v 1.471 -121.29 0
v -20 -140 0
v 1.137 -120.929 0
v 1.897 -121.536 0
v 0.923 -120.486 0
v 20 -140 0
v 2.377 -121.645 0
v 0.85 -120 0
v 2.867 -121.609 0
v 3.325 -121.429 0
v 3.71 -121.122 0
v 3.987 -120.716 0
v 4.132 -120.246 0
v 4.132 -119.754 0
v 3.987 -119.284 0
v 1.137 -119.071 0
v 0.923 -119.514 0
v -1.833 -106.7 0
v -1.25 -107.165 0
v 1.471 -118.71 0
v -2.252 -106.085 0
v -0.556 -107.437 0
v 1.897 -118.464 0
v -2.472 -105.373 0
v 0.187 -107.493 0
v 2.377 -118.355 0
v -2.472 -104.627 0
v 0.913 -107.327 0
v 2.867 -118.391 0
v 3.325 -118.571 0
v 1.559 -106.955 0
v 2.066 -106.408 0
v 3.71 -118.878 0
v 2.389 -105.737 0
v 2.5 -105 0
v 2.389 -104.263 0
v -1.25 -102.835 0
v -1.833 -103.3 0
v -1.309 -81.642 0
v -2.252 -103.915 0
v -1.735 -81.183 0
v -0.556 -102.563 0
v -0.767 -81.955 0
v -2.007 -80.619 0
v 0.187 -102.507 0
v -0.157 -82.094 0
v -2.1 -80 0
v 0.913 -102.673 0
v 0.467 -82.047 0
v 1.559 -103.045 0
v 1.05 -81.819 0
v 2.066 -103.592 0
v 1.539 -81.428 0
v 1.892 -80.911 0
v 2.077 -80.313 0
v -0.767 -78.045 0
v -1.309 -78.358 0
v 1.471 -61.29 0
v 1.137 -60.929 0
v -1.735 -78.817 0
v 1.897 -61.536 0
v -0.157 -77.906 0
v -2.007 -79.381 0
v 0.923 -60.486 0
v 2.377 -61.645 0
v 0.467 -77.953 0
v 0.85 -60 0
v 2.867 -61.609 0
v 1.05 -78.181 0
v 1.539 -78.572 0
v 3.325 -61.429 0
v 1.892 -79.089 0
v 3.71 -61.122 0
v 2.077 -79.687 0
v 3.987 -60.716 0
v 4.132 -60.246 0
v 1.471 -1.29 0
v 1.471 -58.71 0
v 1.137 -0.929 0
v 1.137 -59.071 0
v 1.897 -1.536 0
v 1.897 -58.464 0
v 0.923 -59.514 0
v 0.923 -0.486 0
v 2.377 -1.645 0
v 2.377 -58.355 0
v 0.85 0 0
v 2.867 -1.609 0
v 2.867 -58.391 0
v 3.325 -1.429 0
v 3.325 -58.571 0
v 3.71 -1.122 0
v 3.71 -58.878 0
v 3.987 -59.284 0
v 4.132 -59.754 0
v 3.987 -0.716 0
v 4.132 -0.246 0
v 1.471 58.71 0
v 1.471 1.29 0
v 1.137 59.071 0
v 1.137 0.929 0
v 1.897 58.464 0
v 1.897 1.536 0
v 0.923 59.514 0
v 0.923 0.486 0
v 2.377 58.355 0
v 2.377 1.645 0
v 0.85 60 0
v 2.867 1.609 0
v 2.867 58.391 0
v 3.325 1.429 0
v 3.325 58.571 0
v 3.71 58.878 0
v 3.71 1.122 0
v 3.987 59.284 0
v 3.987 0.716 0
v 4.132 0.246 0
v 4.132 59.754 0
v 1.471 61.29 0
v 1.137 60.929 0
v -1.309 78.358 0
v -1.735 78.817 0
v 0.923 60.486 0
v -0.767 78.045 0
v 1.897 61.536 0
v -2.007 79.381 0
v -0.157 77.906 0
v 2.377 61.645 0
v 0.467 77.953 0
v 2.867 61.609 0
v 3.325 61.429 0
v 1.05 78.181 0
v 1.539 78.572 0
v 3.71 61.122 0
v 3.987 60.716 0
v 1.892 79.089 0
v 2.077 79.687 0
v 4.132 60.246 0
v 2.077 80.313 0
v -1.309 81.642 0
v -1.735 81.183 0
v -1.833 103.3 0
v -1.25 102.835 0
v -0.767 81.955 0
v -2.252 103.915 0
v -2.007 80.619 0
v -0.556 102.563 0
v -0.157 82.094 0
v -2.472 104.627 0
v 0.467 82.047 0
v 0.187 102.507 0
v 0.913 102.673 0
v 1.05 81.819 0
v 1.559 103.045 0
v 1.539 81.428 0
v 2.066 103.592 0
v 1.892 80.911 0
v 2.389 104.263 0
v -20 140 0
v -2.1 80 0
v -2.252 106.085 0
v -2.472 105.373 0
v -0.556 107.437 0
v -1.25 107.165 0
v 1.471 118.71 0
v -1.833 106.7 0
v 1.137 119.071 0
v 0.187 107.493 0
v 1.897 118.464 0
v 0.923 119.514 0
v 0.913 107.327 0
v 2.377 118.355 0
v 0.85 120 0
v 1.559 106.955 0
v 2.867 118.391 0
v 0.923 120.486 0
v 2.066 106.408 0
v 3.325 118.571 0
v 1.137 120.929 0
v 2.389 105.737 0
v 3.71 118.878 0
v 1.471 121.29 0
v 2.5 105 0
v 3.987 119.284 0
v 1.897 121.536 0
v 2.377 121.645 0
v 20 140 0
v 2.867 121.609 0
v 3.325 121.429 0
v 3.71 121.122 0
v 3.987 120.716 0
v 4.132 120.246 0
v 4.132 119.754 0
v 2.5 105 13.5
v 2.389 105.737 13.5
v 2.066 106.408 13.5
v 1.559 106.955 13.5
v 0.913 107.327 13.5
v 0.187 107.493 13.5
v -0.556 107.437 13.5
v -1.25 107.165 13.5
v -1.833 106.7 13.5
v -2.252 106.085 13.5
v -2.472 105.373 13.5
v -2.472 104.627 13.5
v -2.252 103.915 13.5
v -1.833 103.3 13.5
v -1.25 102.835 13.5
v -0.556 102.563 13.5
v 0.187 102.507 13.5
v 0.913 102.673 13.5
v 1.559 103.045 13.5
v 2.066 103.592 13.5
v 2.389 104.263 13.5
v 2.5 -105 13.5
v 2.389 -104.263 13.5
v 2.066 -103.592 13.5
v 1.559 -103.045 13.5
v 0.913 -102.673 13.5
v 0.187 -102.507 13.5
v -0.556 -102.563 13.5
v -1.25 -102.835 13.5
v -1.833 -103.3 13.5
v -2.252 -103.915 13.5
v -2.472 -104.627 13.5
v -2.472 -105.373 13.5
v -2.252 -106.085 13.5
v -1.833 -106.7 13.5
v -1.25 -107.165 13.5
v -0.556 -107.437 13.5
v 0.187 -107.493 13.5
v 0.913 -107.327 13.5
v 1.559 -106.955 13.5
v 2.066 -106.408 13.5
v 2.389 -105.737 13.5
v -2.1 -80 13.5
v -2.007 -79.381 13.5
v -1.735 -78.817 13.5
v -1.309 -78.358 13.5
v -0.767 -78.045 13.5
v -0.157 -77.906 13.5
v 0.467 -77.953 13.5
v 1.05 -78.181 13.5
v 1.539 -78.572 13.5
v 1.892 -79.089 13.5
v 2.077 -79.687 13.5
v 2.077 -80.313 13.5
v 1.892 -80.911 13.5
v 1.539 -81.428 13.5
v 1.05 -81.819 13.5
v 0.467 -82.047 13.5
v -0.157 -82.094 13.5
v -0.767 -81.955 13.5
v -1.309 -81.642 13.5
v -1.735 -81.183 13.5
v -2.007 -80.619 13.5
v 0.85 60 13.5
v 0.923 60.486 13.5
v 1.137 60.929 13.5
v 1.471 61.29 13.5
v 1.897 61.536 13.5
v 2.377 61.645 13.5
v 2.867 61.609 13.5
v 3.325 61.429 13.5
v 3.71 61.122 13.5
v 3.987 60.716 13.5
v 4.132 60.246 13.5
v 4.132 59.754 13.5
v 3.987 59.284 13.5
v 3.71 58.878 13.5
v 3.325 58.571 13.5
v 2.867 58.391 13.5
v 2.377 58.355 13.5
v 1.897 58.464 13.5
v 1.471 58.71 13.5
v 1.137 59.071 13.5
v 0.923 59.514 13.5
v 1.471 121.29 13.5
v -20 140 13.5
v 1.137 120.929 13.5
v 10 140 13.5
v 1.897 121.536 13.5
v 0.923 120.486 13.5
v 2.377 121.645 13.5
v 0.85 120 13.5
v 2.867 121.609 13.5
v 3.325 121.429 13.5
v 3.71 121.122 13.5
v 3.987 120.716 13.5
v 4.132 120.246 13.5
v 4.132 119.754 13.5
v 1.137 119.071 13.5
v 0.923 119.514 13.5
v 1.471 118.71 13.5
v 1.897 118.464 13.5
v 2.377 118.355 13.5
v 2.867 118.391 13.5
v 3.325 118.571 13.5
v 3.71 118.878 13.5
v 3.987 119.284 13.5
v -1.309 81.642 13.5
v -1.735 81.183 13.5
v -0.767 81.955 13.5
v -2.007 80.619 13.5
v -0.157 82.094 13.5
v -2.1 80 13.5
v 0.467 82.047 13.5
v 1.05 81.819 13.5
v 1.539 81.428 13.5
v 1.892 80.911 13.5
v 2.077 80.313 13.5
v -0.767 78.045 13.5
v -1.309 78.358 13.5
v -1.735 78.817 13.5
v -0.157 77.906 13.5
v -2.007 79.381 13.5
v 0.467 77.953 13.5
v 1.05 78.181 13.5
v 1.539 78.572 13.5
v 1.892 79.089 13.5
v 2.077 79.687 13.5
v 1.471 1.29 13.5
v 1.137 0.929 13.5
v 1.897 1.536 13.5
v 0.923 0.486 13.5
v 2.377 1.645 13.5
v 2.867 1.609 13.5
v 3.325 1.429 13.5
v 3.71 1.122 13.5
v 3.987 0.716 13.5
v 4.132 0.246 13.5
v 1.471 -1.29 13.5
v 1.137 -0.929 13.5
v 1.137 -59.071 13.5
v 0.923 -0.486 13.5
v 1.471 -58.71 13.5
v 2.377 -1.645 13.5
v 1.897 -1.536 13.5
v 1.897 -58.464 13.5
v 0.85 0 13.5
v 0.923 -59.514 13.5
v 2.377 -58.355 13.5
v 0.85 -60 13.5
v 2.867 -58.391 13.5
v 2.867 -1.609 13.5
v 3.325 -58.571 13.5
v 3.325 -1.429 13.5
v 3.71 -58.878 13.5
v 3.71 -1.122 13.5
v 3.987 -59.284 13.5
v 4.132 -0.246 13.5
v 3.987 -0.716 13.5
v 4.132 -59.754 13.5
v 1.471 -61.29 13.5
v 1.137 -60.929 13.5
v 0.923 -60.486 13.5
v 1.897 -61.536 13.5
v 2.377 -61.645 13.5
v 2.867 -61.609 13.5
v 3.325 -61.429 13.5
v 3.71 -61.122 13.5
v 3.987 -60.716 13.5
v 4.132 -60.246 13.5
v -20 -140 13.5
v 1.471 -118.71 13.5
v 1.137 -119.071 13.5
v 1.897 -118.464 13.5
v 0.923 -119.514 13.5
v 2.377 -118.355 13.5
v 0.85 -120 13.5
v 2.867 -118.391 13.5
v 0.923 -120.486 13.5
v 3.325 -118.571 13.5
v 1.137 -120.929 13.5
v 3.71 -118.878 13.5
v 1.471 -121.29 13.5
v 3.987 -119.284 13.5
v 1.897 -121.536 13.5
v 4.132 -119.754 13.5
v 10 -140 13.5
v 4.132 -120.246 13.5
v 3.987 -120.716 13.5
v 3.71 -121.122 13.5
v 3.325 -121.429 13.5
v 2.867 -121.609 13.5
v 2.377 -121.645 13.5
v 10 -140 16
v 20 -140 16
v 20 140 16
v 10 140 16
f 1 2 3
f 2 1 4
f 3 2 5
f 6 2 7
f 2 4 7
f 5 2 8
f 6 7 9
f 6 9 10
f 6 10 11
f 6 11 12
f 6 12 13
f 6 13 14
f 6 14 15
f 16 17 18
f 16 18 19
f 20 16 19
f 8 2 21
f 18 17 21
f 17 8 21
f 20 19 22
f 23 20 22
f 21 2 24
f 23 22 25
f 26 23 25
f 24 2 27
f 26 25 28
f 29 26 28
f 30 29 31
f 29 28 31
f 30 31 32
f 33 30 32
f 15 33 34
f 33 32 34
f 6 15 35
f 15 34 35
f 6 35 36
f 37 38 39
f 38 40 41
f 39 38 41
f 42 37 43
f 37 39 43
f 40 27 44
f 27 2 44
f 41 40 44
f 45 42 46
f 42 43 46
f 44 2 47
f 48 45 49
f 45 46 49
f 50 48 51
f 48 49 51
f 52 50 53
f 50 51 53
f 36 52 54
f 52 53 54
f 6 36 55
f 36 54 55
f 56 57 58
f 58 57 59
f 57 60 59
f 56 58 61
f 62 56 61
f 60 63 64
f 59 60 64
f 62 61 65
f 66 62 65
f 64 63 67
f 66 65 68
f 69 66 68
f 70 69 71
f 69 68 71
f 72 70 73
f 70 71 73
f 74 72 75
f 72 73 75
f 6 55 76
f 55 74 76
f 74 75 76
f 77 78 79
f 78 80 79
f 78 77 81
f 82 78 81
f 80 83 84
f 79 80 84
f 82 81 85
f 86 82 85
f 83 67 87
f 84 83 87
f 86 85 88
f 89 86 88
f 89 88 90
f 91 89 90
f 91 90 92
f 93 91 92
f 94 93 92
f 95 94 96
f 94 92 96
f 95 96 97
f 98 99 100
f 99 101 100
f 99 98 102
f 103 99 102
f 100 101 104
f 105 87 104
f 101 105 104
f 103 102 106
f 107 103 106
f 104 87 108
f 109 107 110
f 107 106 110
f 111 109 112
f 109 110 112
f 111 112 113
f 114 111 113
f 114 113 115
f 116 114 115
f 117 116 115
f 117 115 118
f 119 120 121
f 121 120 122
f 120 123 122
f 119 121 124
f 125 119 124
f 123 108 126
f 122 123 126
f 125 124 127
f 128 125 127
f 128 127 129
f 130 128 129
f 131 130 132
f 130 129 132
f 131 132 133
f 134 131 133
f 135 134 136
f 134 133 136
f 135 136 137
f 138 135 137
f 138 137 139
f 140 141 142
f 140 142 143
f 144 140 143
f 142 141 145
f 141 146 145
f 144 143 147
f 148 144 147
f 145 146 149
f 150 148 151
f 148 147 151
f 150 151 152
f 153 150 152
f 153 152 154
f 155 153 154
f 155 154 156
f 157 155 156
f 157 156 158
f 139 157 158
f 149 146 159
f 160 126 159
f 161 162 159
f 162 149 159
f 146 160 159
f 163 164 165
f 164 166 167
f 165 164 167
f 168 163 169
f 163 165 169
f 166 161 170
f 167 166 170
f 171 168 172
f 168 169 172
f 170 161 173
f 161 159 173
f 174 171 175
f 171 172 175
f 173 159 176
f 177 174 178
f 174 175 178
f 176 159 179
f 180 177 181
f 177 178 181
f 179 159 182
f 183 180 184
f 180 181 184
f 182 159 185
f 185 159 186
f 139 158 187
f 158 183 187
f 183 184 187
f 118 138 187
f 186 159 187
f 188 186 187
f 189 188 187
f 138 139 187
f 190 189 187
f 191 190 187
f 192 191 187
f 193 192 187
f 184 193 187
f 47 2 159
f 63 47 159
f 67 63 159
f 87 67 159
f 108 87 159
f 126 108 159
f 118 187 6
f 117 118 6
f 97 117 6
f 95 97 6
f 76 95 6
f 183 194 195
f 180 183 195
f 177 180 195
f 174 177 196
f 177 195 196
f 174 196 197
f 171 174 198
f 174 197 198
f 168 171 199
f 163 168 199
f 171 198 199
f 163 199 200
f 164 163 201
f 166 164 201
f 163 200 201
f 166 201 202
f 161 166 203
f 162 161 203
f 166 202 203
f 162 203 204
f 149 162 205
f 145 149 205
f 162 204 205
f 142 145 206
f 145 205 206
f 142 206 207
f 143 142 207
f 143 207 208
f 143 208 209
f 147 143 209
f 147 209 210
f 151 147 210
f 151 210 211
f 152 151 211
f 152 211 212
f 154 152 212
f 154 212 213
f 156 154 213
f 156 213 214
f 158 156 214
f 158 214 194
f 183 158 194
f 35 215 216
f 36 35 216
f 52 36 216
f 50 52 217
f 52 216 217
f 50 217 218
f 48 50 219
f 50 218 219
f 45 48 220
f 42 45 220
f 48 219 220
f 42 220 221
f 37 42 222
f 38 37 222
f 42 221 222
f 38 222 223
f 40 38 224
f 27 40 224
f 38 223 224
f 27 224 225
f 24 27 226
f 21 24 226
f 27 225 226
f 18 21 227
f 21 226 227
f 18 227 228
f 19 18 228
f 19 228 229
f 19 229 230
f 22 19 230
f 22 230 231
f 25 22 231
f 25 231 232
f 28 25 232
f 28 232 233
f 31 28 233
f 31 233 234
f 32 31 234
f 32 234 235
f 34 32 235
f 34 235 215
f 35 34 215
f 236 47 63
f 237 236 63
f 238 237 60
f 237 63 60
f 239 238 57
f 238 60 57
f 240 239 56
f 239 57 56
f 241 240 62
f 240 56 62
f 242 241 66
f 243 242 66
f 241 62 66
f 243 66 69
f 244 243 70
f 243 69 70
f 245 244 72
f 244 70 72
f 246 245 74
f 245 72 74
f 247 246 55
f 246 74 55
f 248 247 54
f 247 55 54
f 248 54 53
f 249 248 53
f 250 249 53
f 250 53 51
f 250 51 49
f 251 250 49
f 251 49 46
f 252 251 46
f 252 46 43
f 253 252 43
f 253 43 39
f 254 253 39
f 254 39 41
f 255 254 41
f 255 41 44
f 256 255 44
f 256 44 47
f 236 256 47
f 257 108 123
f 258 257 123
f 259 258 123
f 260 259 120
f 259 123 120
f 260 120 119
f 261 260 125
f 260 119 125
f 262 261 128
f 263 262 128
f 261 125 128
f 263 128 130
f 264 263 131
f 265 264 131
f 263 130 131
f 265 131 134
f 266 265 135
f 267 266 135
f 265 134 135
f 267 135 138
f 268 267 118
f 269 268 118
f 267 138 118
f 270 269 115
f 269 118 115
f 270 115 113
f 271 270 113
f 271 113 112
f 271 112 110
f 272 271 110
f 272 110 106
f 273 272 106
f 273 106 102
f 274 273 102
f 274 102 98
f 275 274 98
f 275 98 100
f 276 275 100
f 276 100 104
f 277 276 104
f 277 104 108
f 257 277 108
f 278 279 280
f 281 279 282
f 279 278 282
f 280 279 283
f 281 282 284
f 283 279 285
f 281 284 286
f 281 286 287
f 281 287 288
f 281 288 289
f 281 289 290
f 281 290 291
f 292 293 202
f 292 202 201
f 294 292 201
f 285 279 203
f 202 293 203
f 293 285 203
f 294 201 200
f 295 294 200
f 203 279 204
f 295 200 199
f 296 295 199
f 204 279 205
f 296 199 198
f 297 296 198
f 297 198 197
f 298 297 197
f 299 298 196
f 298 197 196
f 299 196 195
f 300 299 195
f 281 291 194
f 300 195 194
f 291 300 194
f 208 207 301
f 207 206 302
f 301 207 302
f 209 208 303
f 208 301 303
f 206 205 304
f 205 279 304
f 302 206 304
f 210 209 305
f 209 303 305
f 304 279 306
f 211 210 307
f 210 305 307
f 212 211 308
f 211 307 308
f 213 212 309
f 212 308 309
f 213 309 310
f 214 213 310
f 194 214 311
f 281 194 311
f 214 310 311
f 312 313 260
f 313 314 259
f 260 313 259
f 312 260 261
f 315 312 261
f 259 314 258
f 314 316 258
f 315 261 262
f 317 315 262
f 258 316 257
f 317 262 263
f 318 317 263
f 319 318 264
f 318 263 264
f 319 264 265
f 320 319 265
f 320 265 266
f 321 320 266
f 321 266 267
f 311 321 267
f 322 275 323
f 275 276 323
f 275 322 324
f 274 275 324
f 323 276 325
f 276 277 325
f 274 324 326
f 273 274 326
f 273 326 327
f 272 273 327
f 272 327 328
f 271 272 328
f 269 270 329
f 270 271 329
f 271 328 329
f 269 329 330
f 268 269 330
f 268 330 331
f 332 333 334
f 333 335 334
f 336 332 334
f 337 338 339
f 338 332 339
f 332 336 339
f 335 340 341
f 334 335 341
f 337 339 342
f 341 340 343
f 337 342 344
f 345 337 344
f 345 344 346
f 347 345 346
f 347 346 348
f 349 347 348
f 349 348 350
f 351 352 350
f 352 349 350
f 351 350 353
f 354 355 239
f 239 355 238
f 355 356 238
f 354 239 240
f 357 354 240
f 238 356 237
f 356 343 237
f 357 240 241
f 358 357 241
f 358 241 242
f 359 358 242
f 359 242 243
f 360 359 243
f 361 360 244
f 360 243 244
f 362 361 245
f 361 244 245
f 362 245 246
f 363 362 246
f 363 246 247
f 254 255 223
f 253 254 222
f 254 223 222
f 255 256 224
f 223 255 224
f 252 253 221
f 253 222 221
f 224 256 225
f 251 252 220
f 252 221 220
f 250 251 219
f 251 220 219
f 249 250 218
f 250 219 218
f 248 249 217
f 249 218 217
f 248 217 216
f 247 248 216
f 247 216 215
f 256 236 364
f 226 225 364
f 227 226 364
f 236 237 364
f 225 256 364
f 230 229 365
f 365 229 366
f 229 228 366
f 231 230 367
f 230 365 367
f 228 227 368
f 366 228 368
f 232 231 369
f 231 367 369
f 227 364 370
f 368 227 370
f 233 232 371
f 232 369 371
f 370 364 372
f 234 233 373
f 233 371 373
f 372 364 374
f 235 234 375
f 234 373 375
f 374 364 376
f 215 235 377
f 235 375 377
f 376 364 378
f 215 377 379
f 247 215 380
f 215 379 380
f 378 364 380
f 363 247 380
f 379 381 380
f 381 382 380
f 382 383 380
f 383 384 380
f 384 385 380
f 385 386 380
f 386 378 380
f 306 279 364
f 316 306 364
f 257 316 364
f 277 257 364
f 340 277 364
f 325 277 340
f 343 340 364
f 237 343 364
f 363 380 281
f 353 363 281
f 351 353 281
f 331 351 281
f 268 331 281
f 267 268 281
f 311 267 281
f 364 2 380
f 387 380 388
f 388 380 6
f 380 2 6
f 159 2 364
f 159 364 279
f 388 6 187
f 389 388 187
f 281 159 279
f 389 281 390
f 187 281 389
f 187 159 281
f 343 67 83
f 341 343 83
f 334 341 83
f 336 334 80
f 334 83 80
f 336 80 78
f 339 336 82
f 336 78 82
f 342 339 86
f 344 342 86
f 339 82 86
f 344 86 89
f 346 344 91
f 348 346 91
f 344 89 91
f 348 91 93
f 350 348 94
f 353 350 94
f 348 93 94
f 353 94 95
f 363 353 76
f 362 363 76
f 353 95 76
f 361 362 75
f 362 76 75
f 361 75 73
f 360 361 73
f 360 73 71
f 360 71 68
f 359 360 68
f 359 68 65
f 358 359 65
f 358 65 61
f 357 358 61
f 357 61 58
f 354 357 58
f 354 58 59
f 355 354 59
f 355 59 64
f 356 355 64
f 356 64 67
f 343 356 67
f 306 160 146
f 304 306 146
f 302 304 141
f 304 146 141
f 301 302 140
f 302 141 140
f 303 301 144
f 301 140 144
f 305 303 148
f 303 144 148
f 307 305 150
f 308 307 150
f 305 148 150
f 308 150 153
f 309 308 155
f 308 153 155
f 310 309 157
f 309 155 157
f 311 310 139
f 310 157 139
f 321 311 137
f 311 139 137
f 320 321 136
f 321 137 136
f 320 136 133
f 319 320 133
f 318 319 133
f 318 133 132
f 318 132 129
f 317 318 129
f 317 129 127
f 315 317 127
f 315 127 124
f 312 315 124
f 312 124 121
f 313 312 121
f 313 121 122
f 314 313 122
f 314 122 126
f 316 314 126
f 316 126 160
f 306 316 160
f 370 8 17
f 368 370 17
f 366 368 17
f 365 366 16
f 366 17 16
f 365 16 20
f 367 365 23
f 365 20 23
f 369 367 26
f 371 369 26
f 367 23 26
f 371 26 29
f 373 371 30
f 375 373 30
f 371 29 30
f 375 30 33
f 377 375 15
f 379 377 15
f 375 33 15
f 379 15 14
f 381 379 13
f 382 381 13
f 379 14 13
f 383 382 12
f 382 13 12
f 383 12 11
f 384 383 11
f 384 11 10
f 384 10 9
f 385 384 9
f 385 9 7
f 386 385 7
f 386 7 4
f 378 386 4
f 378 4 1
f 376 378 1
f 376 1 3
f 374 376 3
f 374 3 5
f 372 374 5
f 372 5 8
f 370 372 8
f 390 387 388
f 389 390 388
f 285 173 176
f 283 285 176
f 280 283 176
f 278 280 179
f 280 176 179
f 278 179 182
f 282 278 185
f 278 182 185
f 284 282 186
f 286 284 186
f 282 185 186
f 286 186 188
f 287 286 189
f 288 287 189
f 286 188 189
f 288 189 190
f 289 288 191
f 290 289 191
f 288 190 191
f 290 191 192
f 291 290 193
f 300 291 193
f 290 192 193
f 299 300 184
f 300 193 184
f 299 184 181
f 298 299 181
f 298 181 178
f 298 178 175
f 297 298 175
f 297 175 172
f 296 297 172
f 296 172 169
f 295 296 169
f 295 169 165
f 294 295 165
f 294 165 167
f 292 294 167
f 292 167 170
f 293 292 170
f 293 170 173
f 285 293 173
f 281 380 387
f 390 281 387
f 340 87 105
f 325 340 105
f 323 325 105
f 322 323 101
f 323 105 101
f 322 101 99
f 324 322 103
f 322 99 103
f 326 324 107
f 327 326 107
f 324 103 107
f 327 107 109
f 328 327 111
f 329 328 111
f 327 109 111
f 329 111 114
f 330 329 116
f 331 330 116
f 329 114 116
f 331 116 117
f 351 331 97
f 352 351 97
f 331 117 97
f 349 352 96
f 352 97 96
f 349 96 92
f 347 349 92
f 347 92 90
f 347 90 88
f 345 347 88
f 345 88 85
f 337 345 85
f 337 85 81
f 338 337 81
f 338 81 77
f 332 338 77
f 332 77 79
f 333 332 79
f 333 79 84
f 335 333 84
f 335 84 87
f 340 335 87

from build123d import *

# Parameters (mm, degrees)
SKETCH1_W             = 40
SKETCH1_H             = 280
EXTRUDE1_DEPTH        = 16
EXTRUDE2_REACH        = 282
SKETCH2_W             = 30
SKETCH2_H             = 2.5
M4_TAPPED_HOLE1_D     = 3.3
M6_TAPPED_HOLE1_D     = 5
M5_TAPPED_HOLE1_D     = 4.2
M5_TAPPED_HOLE1_DEPTH = 13.5


with BuildPart() as part:
    # Sketch1 → Extrude1 (new body)
    with BuildSketch(Plane.XY):
        Rectangle(SKETCH1_W, SKETCH1_H)
    extrude(amount=EXTRUDE1_DEPTH)

    # Sketch2 → Extrude2 (cut, up to next)
    with BuildSketch(Plane.XZ.offset(140), mode=Mode.PRIVATE) as extrude2_sk1:
        with Locations((-5, 14.75)):
            Rectangle(SKETCH2_W, SKETCH2_H)
    extrude2_tool1 = extrude(extrude2_sk1.sketch, amount=-EXTRUDE2_REACH, mode=Mode.PRIVATE) & part.part
    add(extrude2_tool1.solids().sort_by_distance((-5, -140, 14.75))[0], mode=Mode.SUBTRACT)

    # M4 Tapped Hole1 (through all)
    with Locations(Plane.XY.offset(13.5)):
        with Locations((2.5, -120), (2.5, -60), (2.5, 0), (2.5, 60), (2.5, 120)):
            Hole(M4_TAPPED_HOLE1_D / 2)

    # M6 Tapped Hole1 (through all)
    with Locations(Plane(origin=(0, 0, 0), x_dir=(-1, 0, 0), z_dir=(0, 0, -1))):
        with Locations((0, 105), (0, -105)):
            Hole(M6_TAPPED_HOLE1_D / 2)

    # M5 Tapped Hole1
    with Locations(Plane.XY.offset(13.5)):
        with Locations((0, 80), (0, -80)):
            Hole(M5_TAPPED_HOLE1_D / 2, depth=M5_TAPPED_HOLE1_DEPTH)


solid = part.part
